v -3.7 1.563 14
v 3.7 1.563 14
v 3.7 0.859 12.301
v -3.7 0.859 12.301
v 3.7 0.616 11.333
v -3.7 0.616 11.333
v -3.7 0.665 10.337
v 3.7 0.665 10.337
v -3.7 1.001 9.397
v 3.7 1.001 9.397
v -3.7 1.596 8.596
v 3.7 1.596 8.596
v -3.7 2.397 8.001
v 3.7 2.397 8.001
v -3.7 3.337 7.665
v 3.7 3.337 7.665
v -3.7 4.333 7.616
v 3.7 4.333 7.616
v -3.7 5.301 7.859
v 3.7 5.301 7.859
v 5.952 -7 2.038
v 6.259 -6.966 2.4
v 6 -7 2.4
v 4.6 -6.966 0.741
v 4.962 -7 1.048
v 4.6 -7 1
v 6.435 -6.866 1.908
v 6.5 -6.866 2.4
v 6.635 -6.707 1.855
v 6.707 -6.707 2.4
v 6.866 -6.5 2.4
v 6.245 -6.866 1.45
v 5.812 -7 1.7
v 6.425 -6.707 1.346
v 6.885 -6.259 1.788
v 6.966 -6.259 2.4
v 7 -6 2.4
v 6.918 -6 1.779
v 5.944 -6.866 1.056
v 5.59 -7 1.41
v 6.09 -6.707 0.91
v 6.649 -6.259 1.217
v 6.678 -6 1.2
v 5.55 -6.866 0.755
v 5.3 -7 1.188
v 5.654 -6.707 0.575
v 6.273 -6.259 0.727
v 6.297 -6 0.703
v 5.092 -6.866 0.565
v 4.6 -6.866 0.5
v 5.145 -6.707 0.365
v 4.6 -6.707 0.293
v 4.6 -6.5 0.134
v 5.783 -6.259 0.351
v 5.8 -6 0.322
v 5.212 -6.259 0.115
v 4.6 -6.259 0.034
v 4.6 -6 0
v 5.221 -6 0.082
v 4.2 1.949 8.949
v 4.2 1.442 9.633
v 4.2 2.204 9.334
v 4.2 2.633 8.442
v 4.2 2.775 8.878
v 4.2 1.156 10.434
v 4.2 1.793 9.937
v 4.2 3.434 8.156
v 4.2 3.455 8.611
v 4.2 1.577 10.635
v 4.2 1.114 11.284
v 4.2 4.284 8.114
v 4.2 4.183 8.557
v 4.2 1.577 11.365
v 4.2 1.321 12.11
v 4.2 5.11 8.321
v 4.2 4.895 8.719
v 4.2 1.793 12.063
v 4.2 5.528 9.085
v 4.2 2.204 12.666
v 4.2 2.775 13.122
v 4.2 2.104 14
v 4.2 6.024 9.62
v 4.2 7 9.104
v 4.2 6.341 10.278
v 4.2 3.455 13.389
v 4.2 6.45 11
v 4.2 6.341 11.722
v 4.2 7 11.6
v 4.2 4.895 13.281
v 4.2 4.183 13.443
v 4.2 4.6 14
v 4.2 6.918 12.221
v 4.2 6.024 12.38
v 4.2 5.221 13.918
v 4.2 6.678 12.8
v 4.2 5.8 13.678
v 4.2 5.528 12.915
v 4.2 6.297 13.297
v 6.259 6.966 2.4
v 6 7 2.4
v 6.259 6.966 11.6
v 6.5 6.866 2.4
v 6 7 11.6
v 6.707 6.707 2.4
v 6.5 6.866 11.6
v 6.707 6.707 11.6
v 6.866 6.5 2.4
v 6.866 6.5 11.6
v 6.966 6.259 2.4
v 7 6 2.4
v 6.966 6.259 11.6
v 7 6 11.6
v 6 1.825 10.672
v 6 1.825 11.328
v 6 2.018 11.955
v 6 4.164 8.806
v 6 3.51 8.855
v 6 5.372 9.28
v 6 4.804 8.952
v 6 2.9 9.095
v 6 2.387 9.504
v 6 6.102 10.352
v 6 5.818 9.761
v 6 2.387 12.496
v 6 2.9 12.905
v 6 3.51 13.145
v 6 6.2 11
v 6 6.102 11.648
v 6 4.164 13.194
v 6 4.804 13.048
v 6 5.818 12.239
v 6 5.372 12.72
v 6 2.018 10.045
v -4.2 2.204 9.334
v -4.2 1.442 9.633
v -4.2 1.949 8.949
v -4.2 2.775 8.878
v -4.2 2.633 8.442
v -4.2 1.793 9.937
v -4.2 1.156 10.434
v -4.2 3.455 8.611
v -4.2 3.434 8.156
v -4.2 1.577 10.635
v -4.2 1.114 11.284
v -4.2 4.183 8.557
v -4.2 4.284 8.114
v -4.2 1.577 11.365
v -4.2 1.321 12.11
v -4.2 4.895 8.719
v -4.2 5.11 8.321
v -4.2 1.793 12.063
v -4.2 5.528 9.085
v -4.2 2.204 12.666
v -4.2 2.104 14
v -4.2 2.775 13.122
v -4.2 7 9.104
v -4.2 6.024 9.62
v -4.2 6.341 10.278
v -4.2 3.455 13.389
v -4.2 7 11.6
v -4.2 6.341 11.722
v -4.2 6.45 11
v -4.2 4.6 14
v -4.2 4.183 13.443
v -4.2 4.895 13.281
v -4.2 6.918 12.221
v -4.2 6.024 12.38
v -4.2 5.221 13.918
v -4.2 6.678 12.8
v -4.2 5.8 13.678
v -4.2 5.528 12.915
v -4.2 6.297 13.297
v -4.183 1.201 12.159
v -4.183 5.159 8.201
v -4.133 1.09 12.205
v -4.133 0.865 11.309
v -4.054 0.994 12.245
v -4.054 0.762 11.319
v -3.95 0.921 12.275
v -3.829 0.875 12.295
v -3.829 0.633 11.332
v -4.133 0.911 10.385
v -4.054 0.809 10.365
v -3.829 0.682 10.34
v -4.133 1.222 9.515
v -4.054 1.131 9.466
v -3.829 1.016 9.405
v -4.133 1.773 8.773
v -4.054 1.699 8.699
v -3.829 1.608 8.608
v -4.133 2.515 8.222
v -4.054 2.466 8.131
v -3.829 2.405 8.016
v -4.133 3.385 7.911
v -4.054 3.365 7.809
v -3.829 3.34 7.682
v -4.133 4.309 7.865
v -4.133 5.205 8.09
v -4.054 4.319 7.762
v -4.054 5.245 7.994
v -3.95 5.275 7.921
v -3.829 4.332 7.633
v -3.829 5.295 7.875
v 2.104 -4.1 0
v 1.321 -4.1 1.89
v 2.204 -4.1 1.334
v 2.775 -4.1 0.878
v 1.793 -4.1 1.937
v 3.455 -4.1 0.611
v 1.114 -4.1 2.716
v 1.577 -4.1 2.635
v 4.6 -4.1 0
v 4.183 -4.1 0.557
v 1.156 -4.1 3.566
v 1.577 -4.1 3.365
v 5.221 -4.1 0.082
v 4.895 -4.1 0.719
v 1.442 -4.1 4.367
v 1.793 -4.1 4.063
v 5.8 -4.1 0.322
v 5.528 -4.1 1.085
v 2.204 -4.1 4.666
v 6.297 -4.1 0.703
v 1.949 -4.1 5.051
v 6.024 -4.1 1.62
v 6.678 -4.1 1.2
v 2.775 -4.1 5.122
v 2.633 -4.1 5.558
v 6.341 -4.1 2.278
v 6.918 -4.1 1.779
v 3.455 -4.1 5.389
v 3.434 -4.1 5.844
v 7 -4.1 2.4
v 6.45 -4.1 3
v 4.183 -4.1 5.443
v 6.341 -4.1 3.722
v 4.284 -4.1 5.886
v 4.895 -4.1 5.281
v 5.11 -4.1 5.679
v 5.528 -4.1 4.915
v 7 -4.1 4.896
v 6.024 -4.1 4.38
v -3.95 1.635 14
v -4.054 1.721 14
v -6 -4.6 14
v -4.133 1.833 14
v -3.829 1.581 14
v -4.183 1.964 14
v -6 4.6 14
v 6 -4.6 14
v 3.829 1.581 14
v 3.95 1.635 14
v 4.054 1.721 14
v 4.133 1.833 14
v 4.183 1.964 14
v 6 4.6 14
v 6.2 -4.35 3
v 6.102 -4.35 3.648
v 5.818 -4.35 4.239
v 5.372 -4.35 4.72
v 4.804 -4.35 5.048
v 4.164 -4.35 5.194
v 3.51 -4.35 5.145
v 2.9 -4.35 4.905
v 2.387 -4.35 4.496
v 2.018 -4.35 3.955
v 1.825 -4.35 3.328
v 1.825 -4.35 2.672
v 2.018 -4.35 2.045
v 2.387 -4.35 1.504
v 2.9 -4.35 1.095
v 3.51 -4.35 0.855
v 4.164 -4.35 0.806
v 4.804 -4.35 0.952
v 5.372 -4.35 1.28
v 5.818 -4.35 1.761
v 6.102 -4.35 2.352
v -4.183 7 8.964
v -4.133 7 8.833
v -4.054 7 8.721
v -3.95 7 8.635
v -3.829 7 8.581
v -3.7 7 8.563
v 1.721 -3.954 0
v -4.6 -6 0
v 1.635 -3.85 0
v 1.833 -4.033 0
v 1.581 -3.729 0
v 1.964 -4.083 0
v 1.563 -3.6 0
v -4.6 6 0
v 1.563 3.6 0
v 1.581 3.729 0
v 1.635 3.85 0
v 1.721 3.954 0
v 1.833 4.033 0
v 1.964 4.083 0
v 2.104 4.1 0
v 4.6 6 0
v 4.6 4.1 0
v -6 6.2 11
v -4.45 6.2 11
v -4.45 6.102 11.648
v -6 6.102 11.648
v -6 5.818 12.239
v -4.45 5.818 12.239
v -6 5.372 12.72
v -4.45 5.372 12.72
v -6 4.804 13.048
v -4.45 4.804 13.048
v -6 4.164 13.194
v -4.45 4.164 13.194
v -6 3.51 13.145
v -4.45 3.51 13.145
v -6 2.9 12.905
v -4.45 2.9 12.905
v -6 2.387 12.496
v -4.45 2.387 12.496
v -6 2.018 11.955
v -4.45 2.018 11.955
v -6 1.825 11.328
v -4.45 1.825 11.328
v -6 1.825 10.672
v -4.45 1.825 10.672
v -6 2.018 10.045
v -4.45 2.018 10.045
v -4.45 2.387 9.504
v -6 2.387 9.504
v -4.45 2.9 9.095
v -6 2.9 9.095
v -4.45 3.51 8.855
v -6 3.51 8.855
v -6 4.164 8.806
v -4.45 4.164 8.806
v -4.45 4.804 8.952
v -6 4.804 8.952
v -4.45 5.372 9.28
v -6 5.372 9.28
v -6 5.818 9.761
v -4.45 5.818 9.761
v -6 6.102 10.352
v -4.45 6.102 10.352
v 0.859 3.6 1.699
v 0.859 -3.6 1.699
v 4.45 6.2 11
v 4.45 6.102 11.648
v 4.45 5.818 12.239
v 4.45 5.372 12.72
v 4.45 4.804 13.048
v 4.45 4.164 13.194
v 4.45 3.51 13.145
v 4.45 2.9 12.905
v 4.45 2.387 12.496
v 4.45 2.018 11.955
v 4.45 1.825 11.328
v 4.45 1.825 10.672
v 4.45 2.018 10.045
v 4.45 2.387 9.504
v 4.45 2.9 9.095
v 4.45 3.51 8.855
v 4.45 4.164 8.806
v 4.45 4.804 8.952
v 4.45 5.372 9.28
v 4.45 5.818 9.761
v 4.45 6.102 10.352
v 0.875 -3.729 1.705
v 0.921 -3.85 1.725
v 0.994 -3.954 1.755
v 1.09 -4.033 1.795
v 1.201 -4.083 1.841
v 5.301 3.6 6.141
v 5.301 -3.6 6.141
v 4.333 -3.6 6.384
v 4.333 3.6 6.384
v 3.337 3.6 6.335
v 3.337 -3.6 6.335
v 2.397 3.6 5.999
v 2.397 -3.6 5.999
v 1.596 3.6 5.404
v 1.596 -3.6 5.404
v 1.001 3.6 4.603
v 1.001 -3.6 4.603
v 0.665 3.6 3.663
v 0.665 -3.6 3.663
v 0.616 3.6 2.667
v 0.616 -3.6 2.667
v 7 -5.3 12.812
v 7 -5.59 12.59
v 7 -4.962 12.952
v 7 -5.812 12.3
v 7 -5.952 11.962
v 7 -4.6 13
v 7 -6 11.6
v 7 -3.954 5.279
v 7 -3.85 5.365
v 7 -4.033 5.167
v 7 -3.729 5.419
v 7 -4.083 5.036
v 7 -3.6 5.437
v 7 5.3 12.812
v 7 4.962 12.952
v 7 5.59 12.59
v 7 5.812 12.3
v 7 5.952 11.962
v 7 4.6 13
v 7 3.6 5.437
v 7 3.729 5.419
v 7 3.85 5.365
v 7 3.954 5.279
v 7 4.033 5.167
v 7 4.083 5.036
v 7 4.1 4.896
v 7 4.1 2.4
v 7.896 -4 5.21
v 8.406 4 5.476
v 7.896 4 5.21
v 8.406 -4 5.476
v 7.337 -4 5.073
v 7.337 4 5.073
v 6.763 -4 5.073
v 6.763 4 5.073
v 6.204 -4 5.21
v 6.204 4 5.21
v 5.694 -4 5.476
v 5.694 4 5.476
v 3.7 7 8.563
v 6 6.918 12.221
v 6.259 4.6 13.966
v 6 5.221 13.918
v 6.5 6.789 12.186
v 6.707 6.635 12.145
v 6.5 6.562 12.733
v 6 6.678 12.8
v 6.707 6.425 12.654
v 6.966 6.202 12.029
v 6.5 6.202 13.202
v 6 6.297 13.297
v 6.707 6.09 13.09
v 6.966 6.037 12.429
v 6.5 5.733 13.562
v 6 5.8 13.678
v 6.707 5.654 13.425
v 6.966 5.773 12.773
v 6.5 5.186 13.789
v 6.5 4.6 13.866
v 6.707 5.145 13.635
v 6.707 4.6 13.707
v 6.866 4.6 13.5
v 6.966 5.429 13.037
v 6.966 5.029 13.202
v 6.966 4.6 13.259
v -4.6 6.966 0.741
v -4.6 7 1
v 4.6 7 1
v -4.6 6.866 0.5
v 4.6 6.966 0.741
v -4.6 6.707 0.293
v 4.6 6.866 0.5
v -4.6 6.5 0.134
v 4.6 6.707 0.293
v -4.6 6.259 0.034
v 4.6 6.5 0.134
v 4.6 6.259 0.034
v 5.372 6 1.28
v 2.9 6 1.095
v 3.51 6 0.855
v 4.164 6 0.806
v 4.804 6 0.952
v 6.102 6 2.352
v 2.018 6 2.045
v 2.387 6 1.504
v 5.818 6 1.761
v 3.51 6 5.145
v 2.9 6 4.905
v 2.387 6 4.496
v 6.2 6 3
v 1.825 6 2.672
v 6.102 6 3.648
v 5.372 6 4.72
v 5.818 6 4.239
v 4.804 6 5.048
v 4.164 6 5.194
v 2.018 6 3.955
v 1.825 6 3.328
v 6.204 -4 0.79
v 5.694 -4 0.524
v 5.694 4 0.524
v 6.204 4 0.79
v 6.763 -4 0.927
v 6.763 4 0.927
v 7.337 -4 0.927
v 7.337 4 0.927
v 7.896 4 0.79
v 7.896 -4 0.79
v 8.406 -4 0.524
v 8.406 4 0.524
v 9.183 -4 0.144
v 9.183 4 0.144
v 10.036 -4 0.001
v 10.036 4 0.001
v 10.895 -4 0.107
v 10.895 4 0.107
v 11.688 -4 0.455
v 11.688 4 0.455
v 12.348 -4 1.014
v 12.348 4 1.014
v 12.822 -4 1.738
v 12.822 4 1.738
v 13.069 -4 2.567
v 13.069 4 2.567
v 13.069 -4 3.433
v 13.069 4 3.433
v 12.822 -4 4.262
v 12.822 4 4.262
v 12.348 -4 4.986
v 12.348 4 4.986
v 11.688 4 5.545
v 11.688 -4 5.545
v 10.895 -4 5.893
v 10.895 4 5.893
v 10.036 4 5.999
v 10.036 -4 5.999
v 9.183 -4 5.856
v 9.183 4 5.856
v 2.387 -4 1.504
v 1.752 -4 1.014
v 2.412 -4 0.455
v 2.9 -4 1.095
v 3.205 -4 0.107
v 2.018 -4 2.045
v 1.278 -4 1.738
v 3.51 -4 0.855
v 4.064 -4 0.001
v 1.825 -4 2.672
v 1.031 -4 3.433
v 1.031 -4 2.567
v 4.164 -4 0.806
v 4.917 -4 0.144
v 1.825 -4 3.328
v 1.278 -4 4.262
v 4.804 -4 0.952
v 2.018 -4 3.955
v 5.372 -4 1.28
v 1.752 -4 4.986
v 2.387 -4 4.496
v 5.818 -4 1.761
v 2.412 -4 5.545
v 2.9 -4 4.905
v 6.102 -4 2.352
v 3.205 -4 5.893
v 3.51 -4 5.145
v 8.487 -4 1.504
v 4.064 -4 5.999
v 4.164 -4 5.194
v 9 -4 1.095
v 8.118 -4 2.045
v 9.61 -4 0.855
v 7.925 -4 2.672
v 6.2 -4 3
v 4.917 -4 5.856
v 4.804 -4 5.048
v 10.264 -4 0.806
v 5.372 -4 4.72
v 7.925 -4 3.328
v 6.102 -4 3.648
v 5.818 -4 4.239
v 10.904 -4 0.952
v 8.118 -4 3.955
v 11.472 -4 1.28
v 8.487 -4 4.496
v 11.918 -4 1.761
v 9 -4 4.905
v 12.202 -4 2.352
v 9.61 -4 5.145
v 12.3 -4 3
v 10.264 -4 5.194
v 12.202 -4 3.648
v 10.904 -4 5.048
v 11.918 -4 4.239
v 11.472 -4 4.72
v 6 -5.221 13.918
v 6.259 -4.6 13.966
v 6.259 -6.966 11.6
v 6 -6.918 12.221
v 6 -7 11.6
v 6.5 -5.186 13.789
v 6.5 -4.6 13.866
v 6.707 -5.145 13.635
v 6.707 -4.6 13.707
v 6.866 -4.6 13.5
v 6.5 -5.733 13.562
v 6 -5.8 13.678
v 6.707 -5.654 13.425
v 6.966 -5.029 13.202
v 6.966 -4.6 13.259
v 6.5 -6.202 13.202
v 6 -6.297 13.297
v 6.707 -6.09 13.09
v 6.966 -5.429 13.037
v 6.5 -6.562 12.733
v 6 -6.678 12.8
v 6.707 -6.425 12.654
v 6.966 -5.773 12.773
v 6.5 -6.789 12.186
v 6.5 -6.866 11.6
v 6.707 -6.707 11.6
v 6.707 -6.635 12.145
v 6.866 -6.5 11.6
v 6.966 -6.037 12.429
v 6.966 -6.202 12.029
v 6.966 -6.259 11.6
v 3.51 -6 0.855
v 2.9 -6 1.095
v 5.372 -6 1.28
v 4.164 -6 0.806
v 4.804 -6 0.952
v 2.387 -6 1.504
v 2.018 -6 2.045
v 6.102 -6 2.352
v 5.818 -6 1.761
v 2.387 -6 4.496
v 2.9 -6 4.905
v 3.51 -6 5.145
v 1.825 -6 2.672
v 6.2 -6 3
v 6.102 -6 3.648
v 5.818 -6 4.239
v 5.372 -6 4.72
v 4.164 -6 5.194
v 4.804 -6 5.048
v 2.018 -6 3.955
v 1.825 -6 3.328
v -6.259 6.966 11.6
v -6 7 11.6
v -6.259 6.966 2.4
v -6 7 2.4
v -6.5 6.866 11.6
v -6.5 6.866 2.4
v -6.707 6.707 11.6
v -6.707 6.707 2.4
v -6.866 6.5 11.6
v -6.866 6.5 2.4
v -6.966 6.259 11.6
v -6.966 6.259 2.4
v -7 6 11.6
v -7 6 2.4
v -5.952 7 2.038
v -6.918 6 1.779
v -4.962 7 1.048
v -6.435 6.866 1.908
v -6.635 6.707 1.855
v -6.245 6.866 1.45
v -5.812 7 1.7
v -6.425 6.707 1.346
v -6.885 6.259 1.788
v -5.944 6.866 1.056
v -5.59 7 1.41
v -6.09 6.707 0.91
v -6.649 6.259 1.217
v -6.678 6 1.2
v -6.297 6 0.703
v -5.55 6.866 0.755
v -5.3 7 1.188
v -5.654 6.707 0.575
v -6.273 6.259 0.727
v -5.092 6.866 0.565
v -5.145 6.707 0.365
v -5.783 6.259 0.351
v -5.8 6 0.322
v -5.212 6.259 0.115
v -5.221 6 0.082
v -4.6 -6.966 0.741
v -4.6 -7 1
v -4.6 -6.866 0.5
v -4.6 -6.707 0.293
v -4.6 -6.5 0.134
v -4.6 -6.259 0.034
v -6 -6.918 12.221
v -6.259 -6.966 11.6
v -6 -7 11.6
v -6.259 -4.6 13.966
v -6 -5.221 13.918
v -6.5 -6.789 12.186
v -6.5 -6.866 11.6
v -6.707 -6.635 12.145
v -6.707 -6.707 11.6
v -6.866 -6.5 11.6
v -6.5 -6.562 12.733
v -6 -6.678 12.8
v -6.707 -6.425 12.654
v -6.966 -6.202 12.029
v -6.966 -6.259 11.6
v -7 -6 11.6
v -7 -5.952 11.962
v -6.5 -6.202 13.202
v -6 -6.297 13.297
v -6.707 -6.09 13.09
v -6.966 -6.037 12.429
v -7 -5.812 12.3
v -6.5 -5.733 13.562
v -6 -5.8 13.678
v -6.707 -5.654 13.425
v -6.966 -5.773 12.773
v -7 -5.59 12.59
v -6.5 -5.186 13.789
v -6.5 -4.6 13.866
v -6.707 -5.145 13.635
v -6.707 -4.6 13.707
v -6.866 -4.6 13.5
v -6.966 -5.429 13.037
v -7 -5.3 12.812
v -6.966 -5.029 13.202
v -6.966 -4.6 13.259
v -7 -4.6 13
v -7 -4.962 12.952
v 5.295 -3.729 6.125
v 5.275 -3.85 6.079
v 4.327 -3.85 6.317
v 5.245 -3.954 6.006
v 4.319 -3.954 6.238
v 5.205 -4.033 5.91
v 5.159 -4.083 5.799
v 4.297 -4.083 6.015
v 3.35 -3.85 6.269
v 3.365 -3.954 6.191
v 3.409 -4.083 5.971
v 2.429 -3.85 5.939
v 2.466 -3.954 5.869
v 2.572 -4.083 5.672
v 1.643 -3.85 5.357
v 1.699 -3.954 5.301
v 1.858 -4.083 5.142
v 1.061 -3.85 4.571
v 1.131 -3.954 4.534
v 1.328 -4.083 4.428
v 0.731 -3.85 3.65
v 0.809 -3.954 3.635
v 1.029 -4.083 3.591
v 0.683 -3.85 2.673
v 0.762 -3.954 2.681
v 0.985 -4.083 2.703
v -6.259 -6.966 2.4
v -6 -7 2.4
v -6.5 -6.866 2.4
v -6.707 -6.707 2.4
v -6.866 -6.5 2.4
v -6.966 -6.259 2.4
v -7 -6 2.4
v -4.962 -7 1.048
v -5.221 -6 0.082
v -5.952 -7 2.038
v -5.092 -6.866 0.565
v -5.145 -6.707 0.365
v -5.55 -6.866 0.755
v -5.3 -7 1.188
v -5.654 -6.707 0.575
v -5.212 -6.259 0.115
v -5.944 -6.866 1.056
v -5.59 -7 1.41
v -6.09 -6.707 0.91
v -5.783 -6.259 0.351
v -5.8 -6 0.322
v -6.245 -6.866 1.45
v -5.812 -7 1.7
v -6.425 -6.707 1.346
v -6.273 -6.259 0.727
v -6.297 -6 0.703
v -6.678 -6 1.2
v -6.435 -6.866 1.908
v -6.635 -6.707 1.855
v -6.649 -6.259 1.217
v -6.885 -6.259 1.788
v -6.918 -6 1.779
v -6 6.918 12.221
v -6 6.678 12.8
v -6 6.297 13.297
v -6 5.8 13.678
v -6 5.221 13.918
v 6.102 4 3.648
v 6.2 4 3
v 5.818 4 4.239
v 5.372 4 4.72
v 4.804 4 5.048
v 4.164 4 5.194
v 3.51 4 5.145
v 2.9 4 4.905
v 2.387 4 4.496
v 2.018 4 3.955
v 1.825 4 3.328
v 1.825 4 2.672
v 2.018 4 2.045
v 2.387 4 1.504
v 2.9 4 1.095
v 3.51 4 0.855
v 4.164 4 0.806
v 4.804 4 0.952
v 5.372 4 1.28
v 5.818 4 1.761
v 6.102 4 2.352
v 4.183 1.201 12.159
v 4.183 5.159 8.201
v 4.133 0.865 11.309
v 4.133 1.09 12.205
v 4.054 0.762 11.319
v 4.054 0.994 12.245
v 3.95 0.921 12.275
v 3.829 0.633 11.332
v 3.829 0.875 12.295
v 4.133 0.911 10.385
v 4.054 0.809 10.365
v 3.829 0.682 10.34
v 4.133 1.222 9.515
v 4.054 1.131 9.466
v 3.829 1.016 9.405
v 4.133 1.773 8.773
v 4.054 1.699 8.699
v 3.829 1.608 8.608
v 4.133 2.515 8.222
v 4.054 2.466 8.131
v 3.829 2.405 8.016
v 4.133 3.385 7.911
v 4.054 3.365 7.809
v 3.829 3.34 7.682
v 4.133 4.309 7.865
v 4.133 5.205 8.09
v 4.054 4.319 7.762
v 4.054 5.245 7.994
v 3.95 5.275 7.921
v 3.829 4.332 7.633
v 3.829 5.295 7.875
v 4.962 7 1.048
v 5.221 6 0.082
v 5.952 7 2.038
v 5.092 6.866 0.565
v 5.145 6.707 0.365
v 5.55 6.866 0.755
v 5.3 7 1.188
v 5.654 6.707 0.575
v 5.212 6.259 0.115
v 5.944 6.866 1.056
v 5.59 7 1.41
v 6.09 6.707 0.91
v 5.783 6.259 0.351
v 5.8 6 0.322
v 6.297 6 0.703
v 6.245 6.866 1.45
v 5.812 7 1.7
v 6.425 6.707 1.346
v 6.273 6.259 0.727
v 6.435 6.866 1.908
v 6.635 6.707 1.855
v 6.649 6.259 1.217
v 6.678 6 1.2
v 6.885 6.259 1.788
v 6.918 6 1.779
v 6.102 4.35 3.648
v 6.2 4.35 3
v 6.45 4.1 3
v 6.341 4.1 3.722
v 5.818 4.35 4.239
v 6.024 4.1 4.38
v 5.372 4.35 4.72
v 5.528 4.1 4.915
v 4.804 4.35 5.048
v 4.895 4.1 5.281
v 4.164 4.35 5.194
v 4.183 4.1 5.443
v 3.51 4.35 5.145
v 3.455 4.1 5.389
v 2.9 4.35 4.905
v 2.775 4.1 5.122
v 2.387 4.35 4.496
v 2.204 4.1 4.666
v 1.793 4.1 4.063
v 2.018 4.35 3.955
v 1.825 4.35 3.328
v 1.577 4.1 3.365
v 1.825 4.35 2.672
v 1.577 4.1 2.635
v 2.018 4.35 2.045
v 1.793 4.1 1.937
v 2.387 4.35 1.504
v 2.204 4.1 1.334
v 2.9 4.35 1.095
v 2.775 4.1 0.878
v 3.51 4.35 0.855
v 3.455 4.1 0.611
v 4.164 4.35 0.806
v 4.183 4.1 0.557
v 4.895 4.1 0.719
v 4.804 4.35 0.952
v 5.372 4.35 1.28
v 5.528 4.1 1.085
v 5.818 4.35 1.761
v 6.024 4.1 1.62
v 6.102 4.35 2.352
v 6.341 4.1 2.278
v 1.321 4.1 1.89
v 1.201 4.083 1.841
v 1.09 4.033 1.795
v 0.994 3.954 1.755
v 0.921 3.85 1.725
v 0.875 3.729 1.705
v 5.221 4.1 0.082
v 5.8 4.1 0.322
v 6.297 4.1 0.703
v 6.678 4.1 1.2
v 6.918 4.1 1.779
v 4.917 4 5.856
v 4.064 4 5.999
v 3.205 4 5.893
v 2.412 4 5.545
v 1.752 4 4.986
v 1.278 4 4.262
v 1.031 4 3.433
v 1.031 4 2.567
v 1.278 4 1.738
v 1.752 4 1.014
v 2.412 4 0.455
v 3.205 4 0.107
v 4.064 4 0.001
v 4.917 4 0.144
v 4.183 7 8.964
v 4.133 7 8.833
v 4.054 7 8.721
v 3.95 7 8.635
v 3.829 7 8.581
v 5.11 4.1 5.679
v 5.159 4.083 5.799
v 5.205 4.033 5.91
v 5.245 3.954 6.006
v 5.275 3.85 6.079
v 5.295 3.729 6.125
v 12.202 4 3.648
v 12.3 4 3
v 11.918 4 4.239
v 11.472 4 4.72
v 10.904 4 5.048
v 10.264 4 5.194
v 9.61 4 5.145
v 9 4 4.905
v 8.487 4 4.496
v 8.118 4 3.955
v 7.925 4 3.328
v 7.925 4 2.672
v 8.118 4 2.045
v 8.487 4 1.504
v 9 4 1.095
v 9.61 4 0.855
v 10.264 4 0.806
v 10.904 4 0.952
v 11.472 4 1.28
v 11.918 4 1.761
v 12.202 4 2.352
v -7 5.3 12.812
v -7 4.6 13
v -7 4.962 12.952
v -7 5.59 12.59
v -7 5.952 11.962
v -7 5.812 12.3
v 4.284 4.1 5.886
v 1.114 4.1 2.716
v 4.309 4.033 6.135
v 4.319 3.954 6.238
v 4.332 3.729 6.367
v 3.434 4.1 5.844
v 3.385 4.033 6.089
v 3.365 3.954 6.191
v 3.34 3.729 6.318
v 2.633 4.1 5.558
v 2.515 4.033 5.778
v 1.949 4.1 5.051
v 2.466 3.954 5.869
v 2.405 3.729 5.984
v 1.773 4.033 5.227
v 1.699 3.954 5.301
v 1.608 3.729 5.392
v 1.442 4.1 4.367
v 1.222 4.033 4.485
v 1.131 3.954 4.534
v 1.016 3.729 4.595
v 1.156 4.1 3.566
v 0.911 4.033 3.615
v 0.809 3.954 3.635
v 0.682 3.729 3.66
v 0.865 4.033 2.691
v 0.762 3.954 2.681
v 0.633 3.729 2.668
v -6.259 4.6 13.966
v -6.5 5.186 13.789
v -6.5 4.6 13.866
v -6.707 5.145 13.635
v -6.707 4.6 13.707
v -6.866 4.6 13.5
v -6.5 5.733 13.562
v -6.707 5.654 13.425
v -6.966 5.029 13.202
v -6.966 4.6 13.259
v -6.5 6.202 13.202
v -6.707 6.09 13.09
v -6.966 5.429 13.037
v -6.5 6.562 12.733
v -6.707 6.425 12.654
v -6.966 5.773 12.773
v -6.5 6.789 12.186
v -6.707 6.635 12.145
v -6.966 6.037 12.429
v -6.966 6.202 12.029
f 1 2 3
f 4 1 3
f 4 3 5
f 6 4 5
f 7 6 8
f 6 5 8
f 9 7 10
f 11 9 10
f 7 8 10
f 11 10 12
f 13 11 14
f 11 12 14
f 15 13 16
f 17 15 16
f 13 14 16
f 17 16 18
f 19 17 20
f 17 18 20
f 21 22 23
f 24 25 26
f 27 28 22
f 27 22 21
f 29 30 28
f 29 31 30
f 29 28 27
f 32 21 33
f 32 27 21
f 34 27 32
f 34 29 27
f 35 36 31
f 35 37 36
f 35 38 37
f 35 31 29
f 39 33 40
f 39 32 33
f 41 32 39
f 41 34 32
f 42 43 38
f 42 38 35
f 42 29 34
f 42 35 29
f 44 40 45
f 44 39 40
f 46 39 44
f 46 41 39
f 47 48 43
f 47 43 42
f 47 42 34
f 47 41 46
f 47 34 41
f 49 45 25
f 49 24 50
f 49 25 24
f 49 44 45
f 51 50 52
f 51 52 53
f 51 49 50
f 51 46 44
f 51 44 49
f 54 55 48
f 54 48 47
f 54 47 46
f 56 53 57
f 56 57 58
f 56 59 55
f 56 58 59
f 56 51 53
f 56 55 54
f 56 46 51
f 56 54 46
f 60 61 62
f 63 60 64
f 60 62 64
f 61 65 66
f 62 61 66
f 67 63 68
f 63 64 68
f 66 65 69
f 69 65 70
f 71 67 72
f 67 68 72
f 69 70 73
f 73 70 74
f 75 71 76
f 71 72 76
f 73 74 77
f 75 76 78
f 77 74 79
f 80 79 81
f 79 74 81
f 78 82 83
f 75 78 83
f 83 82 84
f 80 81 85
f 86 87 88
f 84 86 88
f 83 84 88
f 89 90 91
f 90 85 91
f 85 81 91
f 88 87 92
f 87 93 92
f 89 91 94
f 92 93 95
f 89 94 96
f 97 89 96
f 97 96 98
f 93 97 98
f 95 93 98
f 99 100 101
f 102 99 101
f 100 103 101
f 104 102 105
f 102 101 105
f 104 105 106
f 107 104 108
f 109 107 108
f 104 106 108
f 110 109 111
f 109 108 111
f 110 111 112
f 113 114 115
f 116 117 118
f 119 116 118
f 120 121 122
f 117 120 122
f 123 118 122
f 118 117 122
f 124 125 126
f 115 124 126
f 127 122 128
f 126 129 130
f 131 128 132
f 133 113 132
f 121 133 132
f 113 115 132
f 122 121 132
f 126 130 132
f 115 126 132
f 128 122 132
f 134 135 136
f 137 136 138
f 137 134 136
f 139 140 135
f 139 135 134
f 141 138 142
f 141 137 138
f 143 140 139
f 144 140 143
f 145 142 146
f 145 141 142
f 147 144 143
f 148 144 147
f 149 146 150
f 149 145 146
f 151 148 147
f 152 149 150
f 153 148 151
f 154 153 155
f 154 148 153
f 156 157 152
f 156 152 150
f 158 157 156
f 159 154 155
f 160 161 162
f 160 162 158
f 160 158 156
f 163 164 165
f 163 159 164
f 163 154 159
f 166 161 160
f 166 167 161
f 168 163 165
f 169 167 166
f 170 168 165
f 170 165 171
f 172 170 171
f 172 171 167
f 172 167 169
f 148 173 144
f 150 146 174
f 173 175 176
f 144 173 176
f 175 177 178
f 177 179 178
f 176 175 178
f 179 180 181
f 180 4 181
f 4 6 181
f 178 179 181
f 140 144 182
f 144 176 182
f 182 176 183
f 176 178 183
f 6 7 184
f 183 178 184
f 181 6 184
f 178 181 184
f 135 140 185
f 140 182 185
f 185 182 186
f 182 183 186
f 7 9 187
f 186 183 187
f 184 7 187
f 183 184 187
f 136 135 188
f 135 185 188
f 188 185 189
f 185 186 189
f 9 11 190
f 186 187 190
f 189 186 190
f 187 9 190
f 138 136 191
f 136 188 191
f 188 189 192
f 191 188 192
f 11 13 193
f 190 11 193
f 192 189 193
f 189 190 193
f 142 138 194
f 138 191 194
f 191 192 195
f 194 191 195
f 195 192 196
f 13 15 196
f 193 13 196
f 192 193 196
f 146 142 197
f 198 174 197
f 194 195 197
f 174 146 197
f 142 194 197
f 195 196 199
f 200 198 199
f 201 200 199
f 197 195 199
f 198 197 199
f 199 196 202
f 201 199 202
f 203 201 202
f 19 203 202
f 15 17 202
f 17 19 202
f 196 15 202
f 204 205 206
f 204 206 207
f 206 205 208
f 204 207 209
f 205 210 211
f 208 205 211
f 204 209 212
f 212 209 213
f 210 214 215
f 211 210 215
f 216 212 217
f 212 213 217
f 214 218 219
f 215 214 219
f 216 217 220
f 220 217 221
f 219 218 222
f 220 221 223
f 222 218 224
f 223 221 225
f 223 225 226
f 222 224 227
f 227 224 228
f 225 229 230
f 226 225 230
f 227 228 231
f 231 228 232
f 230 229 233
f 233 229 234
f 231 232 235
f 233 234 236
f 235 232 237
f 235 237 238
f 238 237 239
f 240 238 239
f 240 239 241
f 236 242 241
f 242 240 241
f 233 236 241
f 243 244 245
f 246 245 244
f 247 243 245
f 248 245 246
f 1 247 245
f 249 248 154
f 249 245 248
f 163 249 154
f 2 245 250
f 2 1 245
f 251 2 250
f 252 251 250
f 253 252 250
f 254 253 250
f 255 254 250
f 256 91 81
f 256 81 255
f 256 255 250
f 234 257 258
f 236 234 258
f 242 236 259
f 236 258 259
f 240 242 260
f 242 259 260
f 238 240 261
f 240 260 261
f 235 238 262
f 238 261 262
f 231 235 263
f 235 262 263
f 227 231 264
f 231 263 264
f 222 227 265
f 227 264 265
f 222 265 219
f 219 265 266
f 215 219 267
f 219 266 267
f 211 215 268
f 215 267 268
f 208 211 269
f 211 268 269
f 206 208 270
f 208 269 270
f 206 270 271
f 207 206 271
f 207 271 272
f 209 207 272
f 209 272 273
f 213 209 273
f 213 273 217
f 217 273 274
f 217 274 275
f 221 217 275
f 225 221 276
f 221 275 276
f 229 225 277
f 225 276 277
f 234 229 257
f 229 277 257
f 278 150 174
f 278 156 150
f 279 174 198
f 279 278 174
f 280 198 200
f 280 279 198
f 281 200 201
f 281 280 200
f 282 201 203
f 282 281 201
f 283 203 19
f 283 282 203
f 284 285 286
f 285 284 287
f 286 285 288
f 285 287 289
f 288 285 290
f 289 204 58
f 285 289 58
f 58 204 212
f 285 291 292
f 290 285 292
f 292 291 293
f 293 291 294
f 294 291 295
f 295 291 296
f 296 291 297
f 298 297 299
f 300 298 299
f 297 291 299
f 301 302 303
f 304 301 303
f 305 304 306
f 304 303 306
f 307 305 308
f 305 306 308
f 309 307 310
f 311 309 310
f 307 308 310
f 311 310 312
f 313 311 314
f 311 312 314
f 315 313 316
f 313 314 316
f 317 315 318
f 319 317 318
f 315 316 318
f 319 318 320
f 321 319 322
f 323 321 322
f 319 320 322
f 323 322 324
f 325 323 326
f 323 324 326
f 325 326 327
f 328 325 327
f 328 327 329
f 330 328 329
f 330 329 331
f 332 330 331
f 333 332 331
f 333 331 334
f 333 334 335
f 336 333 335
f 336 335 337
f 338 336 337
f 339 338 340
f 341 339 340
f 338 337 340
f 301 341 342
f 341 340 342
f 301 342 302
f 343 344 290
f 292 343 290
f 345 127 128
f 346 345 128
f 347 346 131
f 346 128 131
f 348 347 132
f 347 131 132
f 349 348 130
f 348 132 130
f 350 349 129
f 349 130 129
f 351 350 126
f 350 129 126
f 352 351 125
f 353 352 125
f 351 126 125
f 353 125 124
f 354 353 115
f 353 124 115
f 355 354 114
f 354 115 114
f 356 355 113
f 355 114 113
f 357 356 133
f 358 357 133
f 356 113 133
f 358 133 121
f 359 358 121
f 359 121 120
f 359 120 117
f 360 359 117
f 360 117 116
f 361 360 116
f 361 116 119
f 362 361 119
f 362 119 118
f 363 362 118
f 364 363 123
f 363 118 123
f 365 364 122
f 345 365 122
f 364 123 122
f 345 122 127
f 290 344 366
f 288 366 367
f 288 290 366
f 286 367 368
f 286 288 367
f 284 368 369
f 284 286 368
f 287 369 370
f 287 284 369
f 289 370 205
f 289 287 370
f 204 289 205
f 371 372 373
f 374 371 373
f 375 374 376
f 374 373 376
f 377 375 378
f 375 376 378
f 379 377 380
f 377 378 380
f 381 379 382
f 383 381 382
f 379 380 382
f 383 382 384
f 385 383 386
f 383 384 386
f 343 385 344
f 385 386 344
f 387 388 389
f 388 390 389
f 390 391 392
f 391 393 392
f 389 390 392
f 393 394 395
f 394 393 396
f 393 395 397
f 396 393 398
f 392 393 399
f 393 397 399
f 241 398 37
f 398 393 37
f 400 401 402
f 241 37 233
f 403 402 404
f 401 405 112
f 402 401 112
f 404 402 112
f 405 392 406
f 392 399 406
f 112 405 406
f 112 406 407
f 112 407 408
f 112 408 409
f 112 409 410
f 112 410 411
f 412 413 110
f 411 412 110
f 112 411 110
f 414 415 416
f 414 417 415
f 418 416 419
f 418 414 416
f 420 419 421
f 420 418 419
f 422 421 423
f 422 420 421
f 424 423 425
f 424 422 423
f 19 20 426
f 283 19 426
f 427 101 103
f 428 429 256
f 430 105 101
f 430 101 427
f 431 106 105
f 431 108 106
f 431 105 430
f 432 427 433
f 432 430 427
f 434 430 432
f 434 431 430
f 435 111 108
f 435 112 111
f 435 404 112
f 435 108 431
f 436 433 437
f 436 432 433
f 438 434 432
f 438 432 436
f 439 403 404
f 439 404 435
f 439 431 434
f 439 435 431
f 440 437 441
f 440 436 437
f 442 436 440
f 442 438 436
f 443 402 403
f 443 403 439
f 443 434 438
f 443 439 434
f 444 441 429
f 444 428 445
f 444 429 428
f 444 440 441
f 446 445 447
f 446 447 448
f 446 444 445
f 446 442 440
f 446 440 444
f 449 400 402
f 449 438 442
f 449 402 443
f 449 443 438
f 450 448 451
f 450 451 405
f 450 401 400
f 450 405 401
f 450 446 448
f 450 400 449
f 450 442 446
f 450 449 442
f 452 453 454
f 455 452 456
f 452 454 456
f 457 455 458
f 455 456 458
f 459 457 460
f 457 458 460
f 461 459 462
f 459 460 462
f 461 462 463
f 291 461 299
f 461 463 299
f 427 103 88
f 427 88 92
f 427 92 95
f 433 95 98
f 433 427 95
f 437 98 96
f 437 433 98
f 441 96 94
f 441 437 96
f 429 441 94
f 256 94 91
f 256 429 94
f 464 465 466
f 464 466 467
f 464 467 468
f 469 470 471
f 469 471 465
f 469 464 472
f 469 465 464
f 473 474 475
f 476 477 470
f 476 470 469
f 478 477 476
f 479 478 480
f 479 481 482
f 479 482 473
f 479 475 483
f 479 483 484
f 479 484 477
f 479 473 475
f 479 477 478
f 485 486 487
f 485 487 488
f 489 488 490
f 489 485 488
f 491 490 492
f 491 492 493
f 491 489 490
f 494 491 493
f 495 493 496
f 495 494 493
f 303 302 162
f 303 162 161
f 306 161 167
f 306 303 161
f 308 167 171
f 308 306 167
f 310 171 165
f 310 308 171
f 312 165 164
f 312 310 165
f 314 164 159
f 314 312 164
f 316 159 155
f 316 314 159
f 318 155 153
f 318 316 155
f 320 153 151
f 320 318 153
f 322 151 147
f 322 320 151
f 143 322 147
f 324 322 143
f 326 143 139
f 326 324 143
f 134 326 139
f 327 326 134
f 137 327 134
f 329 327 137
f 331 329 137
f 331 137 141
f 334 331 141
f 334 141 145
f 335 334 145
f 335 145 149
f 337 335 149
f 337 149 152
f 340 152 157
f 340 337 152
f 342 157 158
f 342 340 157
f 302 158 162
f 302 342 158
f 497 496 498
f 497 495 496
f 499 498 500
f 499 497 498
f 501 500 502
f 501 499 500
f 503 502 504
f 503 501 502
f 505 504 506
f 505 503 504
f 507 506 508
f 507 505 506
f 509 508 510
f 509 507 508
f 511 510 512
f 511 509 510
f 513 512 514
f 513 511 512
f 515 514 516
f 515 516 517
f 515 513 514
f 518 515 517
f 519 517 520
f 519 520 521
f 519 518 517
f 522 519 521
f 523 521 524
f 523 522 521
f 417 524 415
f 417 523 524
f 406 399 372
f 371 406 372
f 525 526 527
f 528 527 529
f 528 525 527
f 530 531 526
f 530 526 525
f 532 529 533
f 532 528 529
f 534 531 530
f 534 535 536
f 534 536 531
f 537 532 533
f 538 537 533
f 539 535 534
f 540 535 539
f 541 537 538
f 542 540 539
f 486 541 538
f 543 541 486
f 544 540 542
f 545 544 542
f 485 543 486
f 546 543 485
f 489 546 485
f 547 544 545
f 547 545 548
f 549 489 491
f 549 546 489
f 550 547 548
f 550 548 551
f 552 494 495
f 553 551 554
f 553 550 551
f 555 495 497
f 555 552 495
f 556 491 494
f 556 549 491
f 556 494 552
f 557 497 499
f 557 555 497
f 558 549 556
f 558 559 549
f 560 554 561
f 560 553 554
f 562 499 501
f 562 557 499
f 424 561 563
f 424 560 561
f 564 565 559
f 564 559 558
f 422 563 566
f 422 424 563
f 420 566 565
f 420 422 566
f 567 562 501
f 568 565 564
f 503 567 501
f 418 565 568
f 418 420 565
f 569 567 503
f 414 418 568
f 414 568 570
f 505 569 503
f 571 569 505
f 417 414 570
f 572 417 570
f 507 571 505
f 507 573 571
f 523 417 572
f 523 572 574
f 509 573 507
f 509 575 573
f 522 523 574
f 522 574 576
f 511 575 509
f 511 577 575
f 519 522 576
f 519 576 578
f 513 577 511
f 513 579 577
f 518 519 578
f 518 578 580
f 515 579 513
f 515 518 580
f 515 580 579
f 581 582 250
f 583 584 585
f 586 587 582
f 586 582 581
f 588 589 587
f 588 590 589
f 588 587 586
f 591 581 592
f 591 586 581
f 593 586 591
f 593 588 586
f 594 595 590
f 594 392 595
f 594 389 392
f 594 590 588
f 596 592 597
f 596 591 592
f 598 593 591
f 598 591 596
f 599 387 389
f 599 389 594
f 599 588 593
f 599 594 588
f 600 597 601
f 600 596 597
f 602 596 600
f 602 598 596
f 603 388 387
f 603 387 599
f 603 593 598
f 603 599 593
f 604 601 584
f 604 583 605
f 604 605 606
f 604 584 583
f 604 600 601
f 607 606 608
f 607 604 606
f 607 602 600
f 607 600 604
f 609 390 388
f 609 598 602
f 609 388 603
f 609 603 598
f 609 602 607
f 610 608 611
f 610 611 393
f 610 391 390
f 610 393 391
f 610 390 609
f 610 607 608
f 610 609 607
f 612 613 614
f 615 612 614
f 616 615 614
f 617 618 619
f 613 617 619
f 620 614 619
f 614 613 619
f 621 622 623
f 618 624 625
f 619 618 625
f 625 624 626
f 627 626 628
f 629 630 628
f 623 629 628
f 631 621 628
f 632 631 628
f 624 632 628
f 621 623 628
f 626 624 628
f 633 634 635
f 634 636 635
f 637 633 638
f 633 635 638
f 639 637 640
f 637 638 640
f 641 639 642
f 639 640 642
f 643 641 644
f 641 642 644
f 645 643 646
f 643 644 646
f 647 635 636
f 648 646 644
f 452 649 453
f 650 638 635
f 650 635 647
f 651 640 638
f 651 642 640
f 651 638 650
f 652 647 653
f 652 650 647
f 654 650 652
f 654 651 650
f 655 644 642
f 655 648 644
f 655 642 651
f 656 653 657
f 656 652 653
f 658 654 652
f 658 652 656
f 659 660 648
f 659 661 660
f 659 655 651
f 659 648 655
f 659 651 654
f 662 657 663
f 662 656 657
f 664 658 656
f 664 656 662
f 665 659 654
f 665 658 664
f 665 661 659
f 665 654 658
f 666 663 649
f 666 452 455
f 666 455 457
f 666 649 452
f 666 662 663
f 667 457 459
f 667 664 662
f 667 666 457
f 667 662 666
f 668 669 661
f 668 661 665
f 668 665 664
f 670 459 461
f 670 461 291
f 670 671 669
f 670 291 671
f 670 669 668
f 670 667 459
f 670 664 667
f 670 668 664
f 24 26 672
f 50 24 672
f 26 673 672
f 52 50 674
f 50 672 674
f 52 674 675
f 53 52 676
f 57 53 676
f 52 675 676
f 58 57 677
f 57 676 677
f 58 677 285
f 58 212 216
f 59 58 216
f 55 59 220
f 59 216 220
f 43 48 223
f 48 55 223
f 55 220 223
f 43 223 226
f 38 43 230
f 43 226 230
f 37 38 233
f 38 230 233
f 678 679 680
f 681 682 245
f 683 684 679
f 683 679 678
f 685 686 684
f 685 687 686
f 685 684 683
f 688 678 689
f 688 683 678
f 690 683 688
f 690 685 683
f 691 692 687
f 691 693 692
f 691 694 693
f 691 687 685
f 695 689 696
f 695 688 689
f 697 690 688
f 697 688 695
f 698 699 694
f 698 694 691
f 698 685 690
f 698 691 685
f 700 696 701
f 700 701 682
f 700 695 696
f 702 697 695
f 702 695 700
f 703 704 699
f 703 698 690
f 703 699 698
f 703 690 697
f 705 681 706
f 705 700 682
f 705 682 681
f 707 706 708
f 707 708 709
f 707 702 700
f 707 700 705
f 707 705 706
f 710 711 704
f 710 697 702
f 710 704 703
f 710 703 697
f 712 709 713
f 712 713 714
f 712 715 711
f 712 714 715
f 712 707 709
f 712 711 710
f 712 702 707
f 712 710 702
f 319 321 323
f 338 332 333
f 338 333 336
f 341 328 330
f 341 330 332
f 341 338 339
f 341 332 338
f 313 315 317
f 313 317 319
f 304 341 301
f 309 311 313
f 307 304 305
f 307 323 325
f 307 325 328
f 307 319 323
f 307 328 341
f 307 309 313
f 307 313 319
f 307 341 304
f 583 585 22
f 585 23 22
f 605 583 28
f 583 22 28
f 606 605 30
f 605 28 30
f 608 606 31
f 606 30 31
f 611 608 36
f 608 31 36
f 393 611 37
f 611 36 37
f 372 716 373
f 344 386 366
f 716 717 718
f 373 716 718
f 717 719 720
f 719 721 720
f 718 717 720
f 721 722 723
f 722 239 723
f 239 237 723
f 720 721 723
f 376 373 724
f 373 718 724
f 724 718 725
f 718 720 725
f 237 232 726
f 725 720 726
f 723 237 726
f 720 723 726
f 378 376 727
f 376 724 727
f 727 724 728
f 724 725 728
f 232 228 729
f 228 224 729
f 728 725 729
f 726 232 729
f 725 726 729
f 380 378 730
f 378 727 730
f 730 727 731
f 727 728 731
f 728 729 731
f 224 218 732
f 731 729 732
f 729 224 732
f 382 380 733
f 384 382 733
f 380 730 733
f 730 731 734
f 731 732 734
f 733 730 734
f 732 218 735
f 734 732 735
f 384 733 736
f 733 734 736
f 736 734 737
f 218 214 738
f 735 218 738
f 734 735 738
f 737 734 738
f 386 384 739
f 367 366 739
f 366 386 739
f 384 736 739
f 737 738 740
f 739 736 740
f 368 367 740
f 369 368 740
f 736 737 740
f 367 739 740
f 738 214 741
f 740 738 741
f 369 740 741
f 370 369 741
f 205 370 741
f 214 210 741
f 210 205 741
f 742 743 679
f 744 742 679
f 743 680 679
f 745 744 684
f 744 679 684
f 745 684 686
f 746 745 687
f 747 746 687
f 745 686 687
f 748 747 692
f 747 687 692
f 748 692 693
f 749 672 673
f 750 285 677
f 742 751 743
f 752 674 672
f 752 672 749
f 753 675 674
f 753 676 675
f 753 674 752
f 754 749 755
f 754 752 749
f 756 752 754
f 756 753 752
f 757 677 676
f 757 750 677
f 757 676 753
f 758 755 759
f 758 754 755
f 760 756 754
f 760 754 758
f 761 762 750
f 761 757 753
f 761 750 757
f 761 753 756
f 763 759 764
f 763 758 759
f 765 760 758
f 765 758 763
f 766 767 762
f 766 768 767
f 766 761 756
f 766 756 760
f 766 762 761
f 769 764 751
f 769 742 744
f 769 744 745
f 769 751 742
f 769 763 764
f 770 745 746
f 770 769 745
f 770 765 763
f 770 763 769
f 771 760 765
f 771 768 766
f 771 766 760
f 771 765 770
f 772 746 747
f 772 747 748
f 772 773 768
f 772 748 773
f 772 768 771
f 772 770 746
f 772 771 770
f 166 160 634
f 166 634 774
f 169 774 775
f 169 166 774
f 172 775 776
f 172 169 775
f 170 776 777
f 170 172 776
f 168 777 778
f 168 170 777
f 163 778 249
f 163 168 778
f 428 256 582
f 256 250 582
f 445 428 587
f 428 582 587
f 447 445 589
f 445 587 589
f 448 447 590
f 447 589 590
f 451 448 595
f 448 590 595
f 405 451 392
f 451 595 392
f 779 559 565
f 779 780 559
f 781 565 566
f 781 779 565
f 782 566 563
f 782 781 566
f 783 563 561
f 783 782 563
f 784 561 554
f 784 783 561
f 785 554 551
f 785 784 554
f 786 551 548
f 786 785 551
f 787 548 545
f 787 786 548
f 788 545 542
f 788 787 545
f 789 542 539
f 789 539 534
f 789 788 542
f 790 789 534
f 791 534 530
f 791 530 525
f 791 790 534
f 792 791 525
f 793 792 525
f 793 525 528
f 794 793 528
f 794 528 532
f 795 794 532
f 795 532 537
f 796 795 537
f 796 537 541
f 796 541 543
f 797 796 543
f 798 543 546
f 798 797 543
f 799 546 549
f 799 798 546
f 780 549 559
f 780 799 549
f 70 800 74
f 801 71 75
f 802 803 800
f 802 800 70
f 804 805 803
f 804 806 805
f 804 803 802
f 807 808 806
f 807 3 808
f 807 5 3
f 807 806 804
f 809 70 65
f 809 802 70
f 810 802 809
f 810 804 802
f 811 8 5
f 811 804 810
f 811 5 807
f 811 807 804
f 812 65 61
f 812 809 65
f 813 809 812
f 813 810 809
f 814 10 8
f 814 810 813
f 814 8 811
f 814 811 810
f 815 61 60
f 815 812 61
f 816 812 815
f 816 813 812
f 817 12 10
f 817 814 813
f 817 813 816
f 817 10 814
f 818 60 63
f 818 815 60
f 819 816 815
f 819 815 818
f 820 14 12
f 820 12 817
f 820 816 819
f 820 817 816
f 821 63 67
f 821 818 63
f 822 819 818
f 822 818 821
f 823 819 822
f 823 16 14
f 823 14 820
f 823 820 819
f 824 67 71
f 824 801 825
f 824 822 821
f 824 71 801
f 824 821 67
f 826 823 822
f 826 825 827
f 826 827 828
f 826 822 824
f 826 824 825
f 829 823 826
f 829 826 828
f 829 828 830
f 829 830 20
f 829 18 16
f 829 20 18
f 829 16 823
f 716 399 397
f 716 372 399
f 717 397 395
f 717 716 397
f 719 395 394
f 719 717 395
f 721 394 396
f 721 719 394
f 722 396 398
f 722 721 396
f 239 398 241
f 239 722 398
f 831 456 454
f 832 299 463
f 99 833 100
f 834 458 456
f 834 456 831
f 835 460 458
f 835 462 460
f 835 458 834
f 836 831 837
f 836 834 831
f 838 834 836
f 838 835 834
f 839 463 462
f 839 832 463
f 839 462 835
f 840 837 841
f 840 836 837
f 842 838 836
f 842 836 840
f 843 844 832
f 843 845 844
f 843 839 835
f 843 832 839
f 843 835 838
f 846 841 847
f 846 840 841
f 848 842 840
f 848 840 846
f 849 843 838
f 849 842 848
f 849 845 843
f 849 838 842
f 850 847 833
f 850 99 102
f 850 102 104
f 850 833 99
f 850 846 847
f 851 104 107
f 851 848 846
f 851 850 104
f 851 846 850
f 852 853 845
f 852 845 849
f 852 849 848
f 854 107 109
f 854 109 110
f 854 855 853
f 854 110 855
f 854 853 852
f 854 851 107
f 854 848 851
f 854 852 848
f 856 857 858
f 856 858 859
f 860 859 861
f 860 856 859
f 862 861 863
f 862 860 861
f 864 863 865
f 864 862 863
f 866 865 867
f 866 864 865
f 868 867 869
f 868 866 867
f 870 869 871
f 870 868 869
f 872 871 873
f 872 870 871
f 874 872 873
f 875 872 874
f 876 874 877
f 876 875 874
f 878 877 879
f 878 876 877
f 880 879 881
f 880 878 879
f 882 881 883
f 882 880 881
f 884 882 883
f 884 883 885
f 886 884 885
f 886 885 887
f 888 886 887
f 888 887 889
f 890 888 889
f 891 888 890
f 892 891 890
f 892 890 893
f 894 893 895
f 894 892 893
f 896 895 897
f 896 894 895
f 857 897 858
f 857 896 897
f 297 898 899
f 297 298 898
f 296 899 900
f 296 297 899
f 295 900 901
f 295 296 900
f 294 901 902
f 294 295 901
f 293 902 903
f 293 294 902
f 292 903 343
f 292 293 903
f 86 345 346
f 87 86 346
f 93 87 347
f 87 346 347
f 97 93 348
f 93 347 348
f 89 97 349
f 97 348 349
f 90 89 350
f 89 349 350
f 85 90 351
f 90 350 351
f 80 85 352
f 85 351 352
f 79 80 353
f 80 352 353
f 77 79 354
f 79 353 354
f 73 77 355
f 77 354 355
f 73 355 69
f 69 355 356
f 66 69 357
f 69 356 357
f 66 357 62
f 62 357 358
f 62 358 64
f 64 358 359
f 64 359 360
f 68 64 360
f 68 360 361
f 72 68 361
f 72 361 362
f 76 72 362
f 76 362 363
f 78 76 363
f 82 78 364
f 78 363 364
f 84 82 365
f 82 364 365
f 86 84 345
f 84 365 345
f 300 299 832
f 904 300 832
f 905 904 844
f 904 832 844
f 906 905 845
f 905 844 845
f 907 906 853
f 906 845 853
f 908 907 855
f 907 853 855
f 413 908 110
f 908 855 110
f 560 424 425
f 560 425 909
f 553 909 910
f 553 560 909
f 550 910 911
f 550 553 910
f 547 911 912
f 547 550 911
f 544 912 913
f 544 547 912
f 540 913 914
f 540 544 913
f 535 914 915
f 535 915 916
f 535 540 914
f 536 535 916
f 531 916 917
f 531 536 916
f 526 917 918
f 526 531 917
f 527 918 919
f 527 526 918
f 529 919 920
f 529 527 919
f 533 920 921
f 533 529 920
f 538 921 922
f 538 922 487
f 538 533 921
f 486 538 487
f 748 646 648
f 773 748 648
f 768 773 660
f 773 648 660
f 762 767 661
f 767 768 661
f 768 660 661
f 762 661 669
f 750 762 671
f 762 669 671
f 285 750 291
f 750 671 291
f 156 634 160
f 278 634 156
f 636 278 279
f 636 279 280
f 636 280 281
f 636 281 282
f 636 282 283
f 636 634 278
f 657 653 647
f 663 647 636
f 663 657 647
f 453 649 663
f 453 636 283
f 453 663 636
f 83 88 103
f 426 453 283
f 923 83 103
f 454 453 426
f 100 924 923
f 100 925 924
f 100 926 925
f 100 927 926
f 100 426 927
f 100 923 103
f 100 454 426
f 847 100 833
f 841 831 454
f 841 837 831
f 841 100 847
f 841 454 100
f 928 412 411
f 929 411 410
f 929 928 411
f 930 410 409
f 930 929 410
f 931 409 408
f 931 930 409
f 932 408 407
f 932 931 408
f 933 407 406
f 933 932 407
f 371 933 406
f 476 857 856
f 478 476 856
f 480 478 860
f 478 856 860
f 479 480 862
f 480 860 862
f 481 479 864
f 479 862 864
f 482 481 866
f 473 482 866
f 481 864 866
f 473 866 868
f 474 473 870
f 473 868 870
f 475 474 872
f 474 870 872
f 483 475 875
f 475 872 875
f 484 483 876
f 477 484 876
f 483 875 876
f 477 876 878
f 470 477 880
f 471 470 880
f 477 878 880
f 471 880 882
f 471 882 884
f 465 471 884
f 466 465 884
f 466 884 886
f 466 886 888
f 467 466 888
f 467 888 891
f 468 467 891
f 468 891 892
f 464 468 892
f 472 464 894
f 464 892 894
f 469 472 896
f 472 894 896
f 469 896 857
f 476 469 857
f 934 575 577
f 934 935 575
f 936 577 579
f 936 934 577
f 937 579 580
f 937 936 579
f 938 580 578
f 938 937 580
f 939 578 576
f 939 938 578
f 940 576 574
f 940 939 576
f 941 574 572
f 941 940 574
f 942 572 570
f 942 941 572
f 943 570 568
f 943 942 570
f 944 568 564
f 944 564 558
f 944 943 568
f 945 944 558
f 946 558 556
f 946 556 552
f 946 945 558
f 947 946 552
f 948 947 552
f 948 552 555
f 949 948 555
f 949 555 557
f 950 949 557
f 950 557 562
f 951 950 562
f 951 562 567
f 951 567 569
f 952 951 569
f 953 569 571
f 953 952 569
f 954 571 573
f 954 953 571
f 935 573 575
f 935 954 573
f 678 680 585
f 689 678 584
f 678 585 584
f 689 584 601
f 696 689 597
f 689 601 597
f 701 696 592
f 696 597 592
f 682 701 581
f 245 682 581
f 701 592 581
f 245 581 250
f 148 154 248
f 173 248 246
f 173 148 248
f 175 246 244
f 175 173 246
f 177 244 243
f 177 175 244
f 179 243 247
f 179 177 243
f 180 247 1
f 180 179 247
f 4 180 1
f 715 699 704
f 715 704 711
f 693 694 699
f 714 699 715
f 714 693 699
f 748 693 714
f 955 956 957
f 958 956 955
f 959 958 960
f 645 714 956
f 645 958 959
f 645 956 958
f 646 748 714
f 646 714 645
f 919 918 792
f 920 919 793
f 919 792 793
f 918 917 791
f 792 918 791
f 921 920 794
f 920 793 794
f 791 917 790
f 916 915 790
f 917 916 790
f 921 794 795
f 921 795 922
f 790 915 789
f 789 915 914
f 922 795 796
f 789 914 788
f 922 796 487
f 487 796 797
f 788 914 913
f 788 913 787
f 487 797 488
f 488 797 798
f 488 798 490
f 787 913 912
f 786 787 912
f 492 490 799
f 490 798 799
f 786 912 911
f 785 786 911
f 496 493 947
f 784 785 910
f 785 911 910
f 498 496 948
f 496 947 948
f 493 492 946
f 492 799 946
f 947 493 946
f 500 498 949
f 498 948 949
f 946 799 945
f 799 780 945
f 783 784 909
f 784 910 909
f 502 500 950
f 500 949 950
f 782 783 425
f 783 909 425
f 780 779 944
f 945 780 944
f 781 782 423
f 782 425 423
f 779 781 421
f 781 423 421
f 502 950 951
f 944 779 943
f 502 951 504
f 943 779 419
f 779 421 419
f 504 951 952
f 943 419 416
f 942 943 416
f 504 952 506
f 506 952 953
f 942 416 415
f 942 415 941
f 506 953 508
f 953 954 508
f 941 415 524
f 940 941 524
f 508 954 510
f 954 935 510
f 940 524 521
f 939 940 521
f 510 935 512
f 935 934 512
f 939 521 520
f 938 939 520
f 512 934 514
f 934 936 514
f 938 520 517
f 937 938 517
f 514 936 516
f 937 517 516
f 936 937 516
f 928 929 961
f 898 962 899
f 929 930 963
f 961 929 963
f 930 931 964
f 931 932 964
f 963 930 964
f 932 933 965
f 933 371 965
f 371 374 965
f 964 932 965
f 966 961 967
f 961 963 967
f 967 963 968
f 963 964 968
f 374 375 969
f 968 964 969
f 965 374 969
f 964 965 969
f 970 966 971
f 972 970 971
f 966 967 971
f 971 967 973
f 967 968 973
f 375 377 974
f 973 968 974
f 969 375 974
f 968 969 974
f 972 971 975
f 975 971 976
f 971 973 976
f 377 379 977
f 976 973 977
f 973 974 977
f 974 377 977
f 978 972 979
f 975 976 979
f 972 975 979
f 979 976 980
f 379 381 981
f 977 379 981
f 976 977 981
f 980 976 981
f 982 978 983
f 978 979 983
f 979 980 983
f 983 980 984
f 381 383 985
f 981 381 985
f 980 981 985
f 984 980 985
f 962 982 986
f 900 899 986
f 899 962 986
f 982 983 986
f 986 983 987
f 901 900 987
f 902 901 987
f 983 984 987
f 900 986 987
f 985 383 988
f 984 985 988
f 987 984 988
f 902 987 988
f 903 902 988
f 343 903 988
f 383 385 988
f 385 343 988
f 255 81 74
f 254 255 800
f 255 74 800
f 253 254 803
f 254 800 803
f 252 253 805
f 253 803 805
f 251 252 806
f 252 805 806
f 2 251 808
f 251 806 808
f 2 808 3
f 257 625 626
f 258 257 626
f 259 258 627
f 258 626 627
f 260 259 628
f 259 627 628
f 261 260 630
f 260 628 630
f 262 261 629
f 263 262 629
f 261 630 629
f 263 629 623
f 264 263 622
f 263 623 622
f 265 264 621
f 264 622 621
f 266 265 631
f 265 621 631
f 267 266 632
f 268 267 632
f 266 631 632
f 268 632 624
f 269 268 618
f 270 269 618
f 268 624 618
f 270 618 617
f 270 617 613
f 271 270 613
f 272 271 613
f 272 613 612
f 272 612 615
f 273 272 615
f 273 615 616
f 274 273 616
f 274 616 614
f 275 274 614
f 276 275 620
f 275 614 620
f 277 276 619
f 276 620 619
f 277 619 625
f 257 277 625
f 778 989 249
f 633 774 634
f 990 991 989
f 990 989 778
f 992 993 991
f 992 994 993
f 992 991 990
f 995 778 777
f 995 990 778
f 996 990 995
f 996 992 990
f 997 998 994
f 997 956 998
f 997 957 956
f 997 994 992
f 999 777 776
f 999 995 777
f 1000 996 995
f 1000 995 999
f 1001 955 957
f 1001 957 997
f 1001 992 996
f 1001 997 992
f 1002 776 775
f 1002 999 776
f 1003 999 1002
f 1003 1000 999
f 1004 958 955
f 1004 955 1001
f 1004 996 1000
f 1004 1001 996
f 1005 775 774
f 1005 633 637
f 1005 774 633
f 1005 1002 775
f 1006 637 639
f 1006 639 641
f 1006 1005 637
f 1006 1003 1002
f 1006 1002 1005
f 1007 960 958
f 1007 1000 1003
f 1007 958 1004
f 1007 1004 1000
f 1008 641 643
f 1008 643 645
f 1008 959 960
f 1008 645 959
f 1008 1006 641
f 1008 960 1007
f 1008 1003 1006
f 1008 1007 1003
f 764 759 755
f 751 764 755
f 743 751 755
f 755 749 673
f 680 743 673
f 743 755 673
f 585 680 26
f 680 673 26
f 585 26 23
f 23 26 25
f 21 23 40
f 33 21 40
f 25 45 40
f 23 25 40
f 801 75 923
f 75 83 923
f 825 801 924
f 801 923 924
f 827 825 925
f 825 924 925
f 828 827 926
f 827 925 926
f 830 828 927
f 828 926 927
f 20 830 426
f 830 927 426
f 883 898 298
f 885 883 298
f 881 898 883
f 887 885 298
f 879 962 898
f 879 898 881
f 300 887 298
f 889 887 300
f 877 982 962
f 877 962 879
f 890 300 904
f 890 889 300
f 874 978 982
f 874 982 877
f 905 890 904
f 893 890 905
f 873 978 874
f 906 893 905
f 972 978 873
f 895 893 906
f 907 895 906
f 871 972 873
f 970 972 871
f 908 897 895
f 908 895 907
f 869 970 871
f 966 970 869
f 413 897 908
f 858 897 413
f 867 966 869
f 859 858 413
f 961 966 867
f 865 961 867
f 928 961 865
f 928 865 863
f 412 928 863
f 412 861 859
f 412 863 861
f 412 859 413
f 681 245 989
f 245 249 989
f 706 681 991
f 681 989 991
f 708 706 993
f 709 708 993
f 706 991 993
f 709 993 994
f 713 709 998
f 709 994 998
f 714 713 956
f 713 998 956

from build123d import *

# Parameters (mm, degrees)
F4_W      = 14
F4_H      = 14
F5_DEPTH  = 14
F6_R      = 2.2
F8_DEPTH  = 4.1
F9_DEPTH  = 6
F10_R     = 2.2
F11_DEPTH = 4.2
F12_DEPTH = 6
F13_R     = 2.4
F14_R     = 0.5
F15_R     = 2.2
F16_DEPTH = 4
F17_SIZE  = 0.25
F18_R     = 1


with BuildPart() as f5:
    # F4 (on Top) → F5 (new body)
    with BuildSketch(Plane.XY):
        Rectangle(F4_W, F4_H)
    extrude(amount=F5_DEPTH)

    # F6 (on Front) → F8 (cut, symmetric)
    with BuildSketch(Plane.XZ):
        with BuildLine():
            Line((1.5625072061, 0), (7, 0))
            Line((7, 0), (7, 5.4374927939))
            Line((7, 5.4374927939), (5.30112367, 6.1411904105))
            ThreePointArc((5.30112367, 6.1411904105), (1.595836944, 5.404163056), (0.8588095895, 1.69887633))
            Line((0.8588095895, 1.69887633), (1.5625072061, 0))
        make_face()
        with Locations((4, 3)):
            Circle(F6_R, mode=Mode.SUBTRACT)
        with Locations((4, 3)):
            Circle(F6_R)
    extrude(amount=F8_DEPTH, both=True, mode=Mode.SUBTRACT)

    # F6 (on Front) → F9 (cut, symmetric)
    with BuildSketch(Plane.XZ):
        with Locations((4, 3)):
            Circle(F6_R)
    extrude(amount=F9_DEPTH, both=True, mode=Mode.SUBTRACT)

    # F10 (on Right) → F11 (cut, symmetric)
    with BuildSketch(Plane.YZ):
        with BuildLine():
            Line((7, 14), (1.5625072061, 14))
            Line((1.5625072061, 14), (0.8588095895, 12.30112367))
            ThreePointArc((0.8588095895, 12.30112367), (1.595836944, 8.595836944), (5.30112367, 7.8588095895))
            Line((5.30112367, 7.8588095895), (7, 8.5625072061))
            Line((7, 8.5625072061), (7, 14))
        make_face()
        with Locations((4, 11)):
            Circle(F10_R, mode=Mode.SUBTRACT)
        with Locations((4, 11)):
            Circle(F10_R)
    extrude(amount=F11_DEPTH, both=True, mode=Mode.SUBTRACT)

    # F10 (on Right) → F12 (cut, symmetric)
    with BuildSketch(Plane.YZ):
        with Locations((4, 11)):
            Circle(F10_R)
    extrude(amount=F12_DEPTH, both=True, mode=Mode.SUBTRACT)

    # F13
    f13_edges = [f5.edges().sort_by_distance(p)[0] for p in [
        (7, -5.55, 0),
        (7, 5.55, 0),
        (-5.6, 7, 14),
        (5.6, 7, 14),
        (0, -7, 14),
        (-7, 0, 0),
    ]]
    fillet(f13_edges, radius=F13_R)

    # F14
    f14_edges = [f5.edges().sort_by_distance(p)[0] for p in [
        (1.210658, -4.1, 0.849438),
        (1.210658, 4.1, 0.849438),
        (4.2, 6.150562, 8.210658),
        (-4.2, 6.150562, 8.210658),
    ]]
    fillet(f14_edges, radius=F14_R)

    # F17
    f17_edges = [f5.edges().sort_by_distance(p)[0] for p in [
        (1.8, 4.1, 3),
        (1.8, -4.1, 3),
        (-4.2, 1.8, 11),
        (4.2, 1.8, 11),
    ]]
    chamfer(f17_edges, length=F17_SIZE)

    # F18
    f18_edges = [f5.edges().sort_by_distance(p)[0] for p in [
        (-7, 0, 14),
    ]]
    fillet(f18_edges, radius=F18_R)


with BuildPart() as f16:
    # F15 (on Front) → F16 (new body, symmetric)
    with BuildSketch(Plane.XZ):
        with BuildLine():
            ThreePointArc((8.4055555556, 5.4756530501), (7.05, 5.0561754903), (5.6944444444, 5.4756530501))
            ThreePointArc((5.6944444444, 5.4756530501), (1, 3), (5.6944444444, 0.5243469499))
            ThreePointArc((5.6944444444, 0.5243469499), (7.05, 0.9438245097), (8.4055555556, 0.5243469499))
            ThreePointArc((8.4055555556, 0.5243469499), (13.1, 3), (8.4055555556, 5.4756530501))
        make_face()
        with Locations((4, 3)):
            Circle(F15_R, mode=Mode.SUBTRACT)
        with Locations((10.1, 3)):
            Circle(F15_R, mode=Mode.SUBTRACT)
    extrude(amount=F16_DEPTH, both=True)


solid = Compound([f5.part, f16.part])
